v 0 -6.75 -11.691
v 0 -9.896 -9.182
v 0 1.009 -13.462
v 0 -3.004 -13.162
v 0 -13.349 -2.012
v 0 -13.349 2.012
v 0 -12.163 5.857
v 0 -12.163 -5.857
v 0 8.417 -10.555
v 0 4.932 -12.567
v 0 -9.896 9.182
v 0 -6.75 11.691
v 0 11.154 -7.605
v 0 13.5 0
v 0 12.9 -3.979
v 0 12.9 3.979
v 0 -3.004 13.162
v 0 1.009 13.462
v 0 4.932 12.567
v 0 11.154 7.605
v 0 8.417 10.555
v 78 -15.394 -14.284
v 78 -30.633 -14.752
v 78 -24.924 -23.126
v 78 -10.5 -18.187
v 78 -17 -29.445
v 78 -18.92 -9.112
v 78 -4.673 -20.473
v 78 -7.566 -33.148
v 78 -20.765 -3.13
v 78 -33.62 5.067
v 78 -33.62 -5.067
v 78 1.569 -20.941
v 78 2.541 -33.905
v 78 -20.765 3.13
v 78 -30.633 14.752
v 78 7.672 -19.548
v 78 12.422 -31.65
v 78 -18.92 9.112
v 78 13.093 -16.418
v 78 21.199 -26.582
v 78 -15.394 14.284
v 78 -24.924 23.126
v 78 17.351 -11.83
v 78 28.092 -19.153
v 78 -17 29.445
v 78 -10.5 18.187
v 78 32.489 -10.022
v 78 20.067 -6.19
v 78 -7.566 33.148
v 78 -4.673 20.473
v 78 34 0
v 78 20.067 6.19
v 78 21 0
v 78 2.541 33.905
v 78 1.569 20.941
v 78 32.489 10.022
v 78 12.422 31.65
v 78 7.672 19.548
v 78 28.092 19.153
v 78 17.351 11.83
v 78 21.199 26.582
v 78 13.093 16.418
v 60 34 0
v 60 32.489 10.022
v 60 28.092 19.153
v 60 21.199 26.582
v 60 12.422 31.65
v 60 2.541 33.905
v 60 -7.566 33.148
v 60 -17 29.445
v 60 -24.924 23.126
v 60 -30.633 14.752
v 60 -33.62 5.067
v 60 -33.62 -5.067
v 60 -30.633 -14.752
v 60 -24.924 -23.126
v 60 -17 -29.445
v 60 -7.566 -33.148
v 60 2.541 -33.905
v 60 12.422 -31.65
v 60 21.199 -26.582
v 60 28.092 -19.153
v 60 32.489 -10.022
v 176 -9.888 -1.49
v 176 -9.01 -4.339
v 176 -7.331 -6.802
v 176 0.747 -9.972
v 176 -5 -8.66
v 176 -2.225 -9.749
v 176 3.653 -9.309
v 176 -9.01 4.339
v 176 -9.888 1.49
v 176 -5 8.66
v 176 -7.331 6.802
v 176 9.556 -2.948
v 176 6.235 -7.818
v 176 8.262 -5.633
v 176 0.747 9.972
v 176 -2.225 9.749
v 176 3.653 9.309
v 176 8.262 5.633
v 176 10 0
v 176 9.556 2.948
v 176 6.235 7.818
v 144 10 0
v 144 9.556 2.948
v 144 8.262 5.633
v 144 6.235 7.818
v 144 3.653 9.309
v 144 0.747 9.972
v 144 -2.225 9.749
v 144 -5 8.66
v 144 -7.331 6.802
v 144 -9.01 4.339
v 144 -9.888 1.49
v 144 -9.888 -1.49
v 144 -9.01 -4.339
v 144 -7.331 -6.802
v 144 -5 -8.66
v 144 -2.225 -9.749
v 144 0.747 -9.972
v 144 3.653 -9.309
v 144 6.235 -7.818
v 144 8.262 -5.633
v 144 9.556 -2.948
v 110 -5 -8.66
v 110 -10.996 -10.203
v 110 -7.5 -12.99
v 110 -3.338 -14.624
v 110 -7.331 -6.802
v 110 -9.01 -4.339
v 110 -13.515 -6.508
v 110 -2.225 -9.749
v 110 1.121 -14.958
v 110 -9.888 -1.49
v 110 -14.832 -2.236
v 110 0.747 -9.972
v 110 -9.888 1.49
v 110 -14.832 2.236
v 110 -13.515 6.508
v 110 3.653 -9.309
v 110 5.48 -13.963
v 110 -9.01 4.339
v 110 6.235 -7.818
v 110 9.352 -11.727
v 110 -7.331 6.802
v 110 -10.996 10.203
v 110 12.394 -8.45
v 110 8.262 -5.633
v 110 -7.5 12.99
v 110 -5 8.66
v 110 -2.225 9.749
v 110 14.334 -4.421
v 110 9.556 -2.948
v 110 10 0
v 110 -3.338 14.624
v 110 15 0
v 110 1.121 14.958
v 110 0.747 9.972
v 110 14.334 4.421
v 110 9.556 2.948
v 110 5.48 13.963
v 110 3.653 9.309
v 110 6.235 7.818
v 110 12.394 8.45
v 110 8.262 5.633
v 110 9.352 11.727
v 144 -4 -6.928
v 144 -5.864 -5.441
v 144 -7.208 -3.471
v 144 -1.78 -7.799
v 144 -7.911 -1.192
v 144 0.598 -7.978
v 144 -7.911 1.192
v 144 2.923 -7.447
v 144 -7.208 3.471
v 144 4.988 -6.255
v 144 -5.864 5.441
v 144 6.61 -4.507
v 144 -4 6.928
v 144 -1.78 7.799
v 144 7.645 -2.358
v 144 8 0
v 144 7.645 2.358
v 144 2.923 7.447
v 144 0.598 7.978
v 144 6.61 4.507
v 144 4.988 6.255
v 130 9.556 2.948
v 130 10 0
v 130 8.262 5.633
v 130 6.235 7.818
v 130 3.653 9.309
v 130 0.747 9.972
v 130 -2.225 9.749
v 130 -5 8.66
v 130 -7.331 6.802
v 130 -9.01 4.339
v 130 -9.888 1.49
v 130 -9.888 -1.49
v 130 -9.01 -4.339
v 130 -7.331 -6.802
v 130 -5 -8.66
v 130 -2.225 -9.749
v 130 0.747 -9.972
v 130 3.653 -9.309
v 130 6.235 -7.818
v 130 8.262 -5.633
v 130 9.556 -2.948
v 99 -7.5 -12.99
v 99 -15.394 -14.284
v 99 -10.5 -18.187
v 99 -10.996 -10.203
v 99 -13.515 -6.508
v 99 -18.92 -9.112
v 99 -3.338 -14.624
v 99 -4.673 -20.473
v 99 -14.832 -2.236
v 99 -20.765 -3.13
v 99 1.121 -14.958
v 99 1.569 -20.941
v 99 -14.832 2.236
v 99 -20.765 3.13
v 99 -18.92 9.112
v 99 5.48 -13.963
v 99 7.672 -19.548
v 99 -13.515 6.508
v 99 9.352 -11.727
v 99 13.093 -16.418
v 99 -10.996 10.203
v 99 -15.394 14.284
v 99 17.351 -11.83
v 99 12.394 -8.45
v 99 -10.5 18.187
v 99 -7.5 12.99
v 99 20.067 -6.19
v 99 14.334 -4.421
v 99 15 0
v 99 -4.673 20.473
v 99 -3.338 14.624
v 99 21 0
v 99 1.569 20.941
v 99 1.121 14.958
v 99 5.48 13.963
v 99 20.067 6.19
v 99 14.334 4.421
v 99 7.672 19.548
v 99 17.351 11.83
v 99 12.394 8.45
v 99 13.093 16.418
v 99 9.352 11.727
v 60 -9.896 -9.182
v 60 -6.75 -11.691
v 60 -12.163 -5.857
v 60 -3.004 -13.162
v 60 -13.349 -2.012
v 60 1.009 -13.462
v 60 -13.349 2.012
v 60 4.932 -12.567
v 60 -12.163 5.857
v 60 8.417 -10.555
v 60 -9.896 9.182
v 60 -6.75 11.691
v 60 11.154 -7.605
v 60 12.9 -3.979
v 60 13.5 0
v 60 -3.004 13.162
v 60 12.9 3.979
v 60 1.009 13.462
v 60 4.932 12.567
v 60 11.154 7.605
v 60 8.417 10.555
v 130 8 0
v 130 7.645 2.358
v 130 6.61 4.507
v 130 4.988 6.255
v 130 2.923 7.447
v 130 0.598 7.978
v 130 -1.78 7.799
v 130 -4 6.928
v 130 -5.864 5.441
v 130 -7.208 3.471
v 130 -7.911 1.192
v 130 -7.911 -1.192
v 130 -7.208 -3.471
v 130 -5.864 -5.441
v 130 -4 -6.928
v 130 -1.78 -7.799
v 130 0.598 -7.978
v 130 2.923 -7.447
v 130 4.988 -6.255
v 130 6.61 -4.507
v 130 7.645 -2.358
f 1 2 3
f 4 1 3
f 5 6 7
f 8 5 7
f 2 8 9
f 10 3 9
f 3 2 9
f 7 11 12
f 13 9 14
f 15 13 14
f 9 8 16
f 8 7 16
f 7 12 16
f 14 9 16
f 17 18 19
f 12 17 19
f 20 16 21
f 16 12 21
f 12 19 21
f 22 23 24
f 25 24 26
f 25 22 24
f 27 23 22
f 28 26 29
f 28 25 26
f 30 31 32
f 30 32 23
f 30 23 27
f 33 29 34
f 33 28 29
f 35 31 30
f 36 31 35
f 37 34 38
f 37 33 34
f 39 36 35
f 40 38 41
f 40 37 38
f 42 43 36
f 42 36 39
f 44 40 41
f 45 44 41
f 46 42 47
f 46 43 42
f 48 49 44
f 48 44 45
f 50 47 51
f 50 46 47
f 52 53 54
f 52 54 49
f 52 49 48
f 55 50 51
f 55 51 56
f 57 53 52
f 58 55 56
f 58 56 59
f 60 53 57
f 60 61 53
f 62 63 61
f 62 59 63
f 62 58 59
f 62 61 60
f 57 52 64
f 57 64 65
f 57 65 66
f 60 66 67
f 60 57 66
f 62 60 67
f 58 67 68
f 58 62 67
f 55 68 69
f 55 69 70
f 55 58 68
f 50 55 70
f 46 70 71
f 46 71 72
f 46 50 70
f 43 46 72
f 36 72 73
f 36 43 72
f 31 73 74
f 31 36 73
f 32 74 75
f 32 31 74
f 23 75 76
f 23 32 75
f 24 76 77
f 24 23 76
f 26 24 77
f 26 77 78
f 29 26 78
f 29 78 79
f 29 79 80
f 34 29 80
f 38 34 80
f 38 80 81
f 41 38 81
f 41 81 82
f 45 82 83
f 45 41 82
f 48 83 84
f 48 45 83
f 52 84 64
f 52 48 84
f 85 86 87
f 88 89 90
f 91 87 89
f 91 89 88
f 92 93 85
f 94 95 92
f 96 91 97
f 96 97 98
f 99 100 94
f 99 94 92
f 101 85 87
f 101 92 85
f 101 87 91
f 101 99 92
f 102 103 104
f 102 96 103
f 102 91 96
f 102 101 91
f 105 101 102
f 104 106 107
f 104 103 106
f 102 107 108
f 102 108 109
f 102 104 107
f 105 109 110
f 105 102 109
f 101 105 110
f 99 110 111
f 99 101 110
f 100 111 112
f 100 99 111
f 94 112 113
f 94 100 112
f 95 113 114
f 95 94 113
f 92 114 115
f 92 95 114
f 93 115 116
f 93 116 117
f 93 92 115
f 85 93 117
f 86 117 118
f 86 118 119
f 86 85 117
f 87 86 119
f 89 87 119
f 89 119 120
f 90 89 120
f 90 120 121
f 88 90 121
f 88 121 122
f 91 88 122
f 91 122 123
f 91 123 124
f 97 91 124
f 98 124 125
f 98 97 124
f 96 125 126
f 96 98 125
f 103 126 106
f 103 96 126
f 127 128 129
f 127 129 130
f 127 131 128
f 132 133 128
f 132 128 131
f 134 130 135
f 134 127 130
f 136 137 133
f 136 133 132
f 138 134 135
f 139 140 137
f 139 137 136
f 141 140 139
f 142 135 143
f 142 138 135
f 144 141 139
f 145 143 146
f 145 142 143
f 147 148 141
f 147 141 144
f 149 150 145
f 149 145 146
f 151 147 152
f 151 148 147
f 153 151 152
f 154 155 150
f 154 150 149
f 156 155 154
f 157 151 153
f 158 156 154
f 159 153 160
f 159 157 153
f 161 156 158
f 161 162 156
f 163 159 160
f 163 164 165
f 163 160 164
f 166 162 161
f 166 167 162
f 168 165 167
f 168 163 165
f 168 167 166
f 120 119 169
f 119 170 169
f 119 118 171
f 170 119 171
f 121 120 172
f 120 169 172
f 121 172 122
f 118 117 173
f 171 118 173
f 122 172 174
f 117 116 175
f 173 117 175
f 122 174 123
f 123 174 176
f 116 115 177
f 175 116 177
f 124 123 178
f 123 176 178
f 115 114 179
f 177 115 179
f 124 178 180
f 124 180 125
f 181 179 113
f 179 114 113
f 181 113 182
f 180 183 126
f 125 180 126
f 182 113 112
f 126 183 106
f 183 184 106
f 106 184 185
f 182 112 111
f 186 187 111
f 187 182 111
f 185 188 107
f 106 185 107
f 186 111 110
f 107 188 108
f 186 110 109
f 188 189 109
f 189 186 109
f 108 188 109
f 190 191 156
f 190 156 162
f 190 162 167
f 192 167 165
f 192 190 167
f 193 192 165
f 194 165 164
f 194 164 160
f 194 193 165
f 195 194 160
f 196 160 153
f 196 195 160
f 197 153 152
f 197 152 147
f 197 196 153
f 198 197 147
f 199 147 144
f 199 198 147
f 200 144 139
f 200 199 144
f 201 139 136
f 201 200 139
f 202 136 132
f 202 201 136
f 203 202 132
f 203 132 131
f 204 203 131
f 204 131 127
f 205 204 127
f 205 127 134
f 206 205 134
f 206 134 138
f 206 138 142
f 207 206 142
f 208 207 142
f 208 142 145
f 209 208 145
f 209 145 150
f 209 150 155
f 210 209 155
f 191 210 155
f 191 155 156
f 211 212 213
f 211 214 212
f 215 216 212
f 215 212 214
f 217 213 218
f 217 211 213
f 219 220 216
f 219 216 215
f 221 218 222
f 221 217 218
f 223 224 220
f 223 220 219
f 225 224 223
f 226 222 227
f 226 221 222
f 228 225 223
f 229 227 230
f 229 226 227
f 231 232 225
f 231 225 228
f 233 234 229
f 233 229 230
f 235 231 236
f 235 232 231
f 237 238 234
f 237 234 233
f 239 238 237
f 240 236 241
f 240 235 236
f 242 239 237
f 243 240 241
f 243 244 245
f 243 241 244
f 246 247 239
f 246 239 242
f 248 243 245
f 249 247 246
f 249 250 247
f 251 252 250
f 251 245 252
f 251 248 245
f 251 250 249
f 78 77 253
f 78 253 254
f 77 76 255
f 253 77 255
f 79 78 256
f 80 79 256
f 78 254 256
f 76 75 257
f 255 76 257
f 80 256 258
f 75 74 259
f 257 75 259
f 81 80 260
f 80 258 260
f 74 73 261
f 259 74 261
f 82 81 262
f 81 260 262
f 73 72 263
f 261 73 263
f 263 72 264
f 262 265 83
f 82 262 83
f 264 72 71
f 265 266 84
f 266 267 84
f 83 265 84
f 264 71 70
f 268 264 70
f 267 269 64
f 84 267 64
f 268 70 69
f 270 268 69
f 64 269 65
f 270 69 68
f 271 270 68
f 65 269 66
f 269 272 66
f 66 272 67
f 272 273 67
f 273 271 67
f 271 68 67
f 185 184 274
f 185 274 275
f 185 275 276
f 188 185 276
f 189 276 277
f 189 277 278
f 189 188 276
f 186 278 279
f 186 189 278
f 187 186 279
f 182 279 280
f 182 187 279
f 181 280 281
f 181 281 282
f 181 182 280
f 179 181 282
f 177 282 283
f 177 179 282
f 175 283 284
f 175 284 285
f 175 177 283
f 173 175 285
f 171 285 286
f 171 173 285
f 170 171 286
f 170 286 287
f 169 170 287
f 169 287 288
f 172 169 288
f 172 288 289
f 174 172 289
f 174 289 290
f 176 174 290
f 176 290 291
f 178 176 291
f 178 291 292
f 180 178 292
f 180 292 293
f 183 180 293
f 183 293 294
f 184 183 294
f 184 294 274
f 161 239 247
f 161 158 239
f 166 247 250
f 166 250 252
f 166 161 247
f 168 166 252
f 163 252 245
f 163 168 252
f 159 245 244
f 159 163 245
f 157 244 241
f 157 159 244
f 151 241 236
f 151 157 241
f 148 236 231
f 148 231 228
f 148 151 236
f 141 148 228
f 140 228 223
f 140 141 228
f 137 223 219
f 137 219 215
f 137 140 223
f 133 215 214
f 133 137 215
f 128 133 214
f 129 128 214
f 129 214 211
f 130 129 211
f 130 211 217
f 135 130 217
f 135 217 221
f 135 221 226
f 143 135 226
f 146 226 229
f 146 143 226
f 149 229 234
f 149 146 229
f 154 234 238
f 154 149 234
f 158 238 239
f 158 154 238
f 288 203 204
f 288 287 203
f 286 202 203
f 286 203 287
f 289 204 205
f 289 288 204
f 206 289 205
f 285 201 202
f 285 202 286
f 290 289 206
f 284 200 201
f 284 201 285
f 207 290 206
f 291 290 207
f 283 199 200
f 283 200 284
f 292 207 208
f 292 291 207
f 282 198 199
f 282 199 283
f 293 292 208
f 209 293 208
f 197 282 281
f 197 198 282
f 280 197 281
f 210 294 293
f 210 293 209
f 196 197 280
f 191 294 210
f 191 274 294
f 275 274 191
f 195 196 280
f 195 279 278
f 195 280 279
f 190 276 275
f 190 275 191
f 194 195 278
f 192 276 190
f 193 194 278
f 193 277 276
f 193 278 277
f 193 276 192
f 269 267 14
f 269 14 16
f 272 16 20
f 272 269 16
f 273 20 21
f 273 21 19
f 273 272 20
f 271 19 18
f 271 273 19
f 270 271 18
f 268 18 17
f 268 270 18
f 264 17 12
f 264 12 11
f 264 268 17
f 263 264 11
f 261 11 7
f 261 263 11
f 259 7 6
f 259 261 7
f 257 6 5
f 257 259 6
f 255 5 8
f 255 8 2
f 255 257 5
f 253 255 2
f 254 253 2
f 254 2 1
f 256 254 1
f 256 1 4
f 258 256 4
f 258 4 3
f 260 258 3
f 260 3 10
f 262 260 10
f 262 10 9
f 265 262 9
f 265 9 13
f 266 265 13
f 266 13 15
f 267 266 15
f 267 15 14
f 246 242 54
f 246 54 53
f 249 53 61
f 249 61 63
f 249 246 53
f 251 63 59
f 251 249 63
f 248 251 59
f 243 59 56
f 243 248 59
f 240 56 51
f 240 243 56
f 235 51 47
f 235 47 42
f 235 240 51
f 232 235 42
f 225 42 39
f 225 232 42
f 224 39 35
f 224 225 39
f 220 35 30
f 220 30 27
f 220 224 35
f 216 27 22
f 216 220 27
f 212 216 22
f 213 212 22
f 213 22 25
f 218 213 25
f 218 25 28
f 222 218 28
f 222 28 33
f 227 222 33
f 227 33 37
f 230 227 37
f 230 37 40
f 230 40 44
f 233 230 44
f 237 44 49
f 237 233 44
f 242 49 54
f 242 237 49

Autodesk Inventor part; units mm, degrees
ref_plane "YZ Plane" through (0, 0, 0) normal (1, 0, 0) x (0, 1, 0)
ref_plane "XZ Plane" through (0, 0, 0) normal (0, 1, 0) x (-1, 0, 0)
ref_plane "XY Plane" through (0, 0, 0) normal (0, 0, 1) x (1, 0, 0)
sketch "Sketch1" plane through (0, 0, 0) normal (0, 0, 1) x (1, 0, 0)
  line L0 (0, 0) -> (0, 13.5)
  line L1 (0, 13.5) -> (60, 13.5)
  line L2 (60, 13.5) -> (60, 0) construction
  line L3 (60, 0) -> (60, 34)
  line L4 (60, 34) -> (78, 34)
  line L5 (78, 34) -> (78, 0)
  line L6 (78, 0) -> (78, 21)
  line L7 (78, 21) -> (99, 21)
  line L8 (99, 21) -> (99, 0)
  line L9 (99, 0) -> (99, 15)
  line L10 (99, 15) -> (110, 15)
  line L11 (110, 15) -> (110, 0)
  line L12 (110, 0) -> (110, 10)
  line L13 (110, 10) -> (130, 10)
  line L14 (130, 10) -> (130, 0)
  line L15 (130, 0) -> (130, 8)
  line L16 (130, 8) -> (144, 8)
  line L17 (144, 8) -> (144, 0)
  line L18 (144, 0) -> (144, 10)
  line L19 (144, 10) -> (176, 10)
  line L20 (176, 10) -> (176, 0)
  line L21 (0, 0) -> (291.3618, 0) construction
  line L22 (0, 0) -> (176, 0)
  line L23 (47.9027, 0) -> (47.9027, 4) construction
  line L24 (60, 4) -> (56.5, 4) construction
  line L25 (52.5, 4) -> (40.5, 4)
  line L26 (36.5, 4) -> (33, 4) construction
  line L27 (33, 4) -> (0, 4) construction
  line L28 (46.5, 4) -> (46.5, 2) construction
  line L29 (46.5, 2) -> (40.5, 2) construction
  arc A0 (40.5, 4) -> (40.5, -4) centre (40.5, 0) ccw
  line L30 (46.5, 2) -> (52.5, 2) construction
  arc A1 (52.5, -4) -> (52.5, 4) centre (52.5, 0) ccw
  line L31 (40.5, -4) -> (52.5, -4)
  dimension "d4" = 13.5
  dimension "d5" = 60
  dimension "d9" = 18
  dimension "d10" = 21
  dimension "d11" = 21
  dimension "d12" = 15
  dimension "d13" = 11
  dimension "d14" = 10
  dimension "d15" = 20
  dimension "d16" = 8
  dimension "d17" = 14
  dimension "d18" = 10
  dimension "d19" = 32
  dimension "d28" = 3.5
  dimension "d29" = 20
  dimension "d30" = 3.5
  dimension "d31" = 6
  dimension "d32" = 8
  dimension "d33" = 6
  dimension "d34" = 8
revolve "Revolution1" add sketch "Sketch1" angle 360 about axis through (0, 0, 0) along (1, 0, 0) contours L0 L1 L3 L22 A1 L25 A0 | A0 L25 A1 L22 | L3 L4 L5 L22 | L5 L7 L8 L22 | L8 L10 L11 L22 | L11 L13 L14 L22 | L14 L16 L17 L22 | L17 L18 L19 L20 L22
sketch "Sketch2" plane through (0, 0, 0) normal (-1, 0, 0) x (0, 0, 1)
  circle A0 centre (0, 0) radius 13.5 projected
  line L0 (-13.5, 0) -> (9.5, 0) construction
  line L1 (9.5, 0) -> (9.5, 4) construction
  line L2 (9.5, 0) -> (9.5, -4) construction
  dimension "d21" = 23
  dimension "d22" = 4
  dimension "d23" = 4
